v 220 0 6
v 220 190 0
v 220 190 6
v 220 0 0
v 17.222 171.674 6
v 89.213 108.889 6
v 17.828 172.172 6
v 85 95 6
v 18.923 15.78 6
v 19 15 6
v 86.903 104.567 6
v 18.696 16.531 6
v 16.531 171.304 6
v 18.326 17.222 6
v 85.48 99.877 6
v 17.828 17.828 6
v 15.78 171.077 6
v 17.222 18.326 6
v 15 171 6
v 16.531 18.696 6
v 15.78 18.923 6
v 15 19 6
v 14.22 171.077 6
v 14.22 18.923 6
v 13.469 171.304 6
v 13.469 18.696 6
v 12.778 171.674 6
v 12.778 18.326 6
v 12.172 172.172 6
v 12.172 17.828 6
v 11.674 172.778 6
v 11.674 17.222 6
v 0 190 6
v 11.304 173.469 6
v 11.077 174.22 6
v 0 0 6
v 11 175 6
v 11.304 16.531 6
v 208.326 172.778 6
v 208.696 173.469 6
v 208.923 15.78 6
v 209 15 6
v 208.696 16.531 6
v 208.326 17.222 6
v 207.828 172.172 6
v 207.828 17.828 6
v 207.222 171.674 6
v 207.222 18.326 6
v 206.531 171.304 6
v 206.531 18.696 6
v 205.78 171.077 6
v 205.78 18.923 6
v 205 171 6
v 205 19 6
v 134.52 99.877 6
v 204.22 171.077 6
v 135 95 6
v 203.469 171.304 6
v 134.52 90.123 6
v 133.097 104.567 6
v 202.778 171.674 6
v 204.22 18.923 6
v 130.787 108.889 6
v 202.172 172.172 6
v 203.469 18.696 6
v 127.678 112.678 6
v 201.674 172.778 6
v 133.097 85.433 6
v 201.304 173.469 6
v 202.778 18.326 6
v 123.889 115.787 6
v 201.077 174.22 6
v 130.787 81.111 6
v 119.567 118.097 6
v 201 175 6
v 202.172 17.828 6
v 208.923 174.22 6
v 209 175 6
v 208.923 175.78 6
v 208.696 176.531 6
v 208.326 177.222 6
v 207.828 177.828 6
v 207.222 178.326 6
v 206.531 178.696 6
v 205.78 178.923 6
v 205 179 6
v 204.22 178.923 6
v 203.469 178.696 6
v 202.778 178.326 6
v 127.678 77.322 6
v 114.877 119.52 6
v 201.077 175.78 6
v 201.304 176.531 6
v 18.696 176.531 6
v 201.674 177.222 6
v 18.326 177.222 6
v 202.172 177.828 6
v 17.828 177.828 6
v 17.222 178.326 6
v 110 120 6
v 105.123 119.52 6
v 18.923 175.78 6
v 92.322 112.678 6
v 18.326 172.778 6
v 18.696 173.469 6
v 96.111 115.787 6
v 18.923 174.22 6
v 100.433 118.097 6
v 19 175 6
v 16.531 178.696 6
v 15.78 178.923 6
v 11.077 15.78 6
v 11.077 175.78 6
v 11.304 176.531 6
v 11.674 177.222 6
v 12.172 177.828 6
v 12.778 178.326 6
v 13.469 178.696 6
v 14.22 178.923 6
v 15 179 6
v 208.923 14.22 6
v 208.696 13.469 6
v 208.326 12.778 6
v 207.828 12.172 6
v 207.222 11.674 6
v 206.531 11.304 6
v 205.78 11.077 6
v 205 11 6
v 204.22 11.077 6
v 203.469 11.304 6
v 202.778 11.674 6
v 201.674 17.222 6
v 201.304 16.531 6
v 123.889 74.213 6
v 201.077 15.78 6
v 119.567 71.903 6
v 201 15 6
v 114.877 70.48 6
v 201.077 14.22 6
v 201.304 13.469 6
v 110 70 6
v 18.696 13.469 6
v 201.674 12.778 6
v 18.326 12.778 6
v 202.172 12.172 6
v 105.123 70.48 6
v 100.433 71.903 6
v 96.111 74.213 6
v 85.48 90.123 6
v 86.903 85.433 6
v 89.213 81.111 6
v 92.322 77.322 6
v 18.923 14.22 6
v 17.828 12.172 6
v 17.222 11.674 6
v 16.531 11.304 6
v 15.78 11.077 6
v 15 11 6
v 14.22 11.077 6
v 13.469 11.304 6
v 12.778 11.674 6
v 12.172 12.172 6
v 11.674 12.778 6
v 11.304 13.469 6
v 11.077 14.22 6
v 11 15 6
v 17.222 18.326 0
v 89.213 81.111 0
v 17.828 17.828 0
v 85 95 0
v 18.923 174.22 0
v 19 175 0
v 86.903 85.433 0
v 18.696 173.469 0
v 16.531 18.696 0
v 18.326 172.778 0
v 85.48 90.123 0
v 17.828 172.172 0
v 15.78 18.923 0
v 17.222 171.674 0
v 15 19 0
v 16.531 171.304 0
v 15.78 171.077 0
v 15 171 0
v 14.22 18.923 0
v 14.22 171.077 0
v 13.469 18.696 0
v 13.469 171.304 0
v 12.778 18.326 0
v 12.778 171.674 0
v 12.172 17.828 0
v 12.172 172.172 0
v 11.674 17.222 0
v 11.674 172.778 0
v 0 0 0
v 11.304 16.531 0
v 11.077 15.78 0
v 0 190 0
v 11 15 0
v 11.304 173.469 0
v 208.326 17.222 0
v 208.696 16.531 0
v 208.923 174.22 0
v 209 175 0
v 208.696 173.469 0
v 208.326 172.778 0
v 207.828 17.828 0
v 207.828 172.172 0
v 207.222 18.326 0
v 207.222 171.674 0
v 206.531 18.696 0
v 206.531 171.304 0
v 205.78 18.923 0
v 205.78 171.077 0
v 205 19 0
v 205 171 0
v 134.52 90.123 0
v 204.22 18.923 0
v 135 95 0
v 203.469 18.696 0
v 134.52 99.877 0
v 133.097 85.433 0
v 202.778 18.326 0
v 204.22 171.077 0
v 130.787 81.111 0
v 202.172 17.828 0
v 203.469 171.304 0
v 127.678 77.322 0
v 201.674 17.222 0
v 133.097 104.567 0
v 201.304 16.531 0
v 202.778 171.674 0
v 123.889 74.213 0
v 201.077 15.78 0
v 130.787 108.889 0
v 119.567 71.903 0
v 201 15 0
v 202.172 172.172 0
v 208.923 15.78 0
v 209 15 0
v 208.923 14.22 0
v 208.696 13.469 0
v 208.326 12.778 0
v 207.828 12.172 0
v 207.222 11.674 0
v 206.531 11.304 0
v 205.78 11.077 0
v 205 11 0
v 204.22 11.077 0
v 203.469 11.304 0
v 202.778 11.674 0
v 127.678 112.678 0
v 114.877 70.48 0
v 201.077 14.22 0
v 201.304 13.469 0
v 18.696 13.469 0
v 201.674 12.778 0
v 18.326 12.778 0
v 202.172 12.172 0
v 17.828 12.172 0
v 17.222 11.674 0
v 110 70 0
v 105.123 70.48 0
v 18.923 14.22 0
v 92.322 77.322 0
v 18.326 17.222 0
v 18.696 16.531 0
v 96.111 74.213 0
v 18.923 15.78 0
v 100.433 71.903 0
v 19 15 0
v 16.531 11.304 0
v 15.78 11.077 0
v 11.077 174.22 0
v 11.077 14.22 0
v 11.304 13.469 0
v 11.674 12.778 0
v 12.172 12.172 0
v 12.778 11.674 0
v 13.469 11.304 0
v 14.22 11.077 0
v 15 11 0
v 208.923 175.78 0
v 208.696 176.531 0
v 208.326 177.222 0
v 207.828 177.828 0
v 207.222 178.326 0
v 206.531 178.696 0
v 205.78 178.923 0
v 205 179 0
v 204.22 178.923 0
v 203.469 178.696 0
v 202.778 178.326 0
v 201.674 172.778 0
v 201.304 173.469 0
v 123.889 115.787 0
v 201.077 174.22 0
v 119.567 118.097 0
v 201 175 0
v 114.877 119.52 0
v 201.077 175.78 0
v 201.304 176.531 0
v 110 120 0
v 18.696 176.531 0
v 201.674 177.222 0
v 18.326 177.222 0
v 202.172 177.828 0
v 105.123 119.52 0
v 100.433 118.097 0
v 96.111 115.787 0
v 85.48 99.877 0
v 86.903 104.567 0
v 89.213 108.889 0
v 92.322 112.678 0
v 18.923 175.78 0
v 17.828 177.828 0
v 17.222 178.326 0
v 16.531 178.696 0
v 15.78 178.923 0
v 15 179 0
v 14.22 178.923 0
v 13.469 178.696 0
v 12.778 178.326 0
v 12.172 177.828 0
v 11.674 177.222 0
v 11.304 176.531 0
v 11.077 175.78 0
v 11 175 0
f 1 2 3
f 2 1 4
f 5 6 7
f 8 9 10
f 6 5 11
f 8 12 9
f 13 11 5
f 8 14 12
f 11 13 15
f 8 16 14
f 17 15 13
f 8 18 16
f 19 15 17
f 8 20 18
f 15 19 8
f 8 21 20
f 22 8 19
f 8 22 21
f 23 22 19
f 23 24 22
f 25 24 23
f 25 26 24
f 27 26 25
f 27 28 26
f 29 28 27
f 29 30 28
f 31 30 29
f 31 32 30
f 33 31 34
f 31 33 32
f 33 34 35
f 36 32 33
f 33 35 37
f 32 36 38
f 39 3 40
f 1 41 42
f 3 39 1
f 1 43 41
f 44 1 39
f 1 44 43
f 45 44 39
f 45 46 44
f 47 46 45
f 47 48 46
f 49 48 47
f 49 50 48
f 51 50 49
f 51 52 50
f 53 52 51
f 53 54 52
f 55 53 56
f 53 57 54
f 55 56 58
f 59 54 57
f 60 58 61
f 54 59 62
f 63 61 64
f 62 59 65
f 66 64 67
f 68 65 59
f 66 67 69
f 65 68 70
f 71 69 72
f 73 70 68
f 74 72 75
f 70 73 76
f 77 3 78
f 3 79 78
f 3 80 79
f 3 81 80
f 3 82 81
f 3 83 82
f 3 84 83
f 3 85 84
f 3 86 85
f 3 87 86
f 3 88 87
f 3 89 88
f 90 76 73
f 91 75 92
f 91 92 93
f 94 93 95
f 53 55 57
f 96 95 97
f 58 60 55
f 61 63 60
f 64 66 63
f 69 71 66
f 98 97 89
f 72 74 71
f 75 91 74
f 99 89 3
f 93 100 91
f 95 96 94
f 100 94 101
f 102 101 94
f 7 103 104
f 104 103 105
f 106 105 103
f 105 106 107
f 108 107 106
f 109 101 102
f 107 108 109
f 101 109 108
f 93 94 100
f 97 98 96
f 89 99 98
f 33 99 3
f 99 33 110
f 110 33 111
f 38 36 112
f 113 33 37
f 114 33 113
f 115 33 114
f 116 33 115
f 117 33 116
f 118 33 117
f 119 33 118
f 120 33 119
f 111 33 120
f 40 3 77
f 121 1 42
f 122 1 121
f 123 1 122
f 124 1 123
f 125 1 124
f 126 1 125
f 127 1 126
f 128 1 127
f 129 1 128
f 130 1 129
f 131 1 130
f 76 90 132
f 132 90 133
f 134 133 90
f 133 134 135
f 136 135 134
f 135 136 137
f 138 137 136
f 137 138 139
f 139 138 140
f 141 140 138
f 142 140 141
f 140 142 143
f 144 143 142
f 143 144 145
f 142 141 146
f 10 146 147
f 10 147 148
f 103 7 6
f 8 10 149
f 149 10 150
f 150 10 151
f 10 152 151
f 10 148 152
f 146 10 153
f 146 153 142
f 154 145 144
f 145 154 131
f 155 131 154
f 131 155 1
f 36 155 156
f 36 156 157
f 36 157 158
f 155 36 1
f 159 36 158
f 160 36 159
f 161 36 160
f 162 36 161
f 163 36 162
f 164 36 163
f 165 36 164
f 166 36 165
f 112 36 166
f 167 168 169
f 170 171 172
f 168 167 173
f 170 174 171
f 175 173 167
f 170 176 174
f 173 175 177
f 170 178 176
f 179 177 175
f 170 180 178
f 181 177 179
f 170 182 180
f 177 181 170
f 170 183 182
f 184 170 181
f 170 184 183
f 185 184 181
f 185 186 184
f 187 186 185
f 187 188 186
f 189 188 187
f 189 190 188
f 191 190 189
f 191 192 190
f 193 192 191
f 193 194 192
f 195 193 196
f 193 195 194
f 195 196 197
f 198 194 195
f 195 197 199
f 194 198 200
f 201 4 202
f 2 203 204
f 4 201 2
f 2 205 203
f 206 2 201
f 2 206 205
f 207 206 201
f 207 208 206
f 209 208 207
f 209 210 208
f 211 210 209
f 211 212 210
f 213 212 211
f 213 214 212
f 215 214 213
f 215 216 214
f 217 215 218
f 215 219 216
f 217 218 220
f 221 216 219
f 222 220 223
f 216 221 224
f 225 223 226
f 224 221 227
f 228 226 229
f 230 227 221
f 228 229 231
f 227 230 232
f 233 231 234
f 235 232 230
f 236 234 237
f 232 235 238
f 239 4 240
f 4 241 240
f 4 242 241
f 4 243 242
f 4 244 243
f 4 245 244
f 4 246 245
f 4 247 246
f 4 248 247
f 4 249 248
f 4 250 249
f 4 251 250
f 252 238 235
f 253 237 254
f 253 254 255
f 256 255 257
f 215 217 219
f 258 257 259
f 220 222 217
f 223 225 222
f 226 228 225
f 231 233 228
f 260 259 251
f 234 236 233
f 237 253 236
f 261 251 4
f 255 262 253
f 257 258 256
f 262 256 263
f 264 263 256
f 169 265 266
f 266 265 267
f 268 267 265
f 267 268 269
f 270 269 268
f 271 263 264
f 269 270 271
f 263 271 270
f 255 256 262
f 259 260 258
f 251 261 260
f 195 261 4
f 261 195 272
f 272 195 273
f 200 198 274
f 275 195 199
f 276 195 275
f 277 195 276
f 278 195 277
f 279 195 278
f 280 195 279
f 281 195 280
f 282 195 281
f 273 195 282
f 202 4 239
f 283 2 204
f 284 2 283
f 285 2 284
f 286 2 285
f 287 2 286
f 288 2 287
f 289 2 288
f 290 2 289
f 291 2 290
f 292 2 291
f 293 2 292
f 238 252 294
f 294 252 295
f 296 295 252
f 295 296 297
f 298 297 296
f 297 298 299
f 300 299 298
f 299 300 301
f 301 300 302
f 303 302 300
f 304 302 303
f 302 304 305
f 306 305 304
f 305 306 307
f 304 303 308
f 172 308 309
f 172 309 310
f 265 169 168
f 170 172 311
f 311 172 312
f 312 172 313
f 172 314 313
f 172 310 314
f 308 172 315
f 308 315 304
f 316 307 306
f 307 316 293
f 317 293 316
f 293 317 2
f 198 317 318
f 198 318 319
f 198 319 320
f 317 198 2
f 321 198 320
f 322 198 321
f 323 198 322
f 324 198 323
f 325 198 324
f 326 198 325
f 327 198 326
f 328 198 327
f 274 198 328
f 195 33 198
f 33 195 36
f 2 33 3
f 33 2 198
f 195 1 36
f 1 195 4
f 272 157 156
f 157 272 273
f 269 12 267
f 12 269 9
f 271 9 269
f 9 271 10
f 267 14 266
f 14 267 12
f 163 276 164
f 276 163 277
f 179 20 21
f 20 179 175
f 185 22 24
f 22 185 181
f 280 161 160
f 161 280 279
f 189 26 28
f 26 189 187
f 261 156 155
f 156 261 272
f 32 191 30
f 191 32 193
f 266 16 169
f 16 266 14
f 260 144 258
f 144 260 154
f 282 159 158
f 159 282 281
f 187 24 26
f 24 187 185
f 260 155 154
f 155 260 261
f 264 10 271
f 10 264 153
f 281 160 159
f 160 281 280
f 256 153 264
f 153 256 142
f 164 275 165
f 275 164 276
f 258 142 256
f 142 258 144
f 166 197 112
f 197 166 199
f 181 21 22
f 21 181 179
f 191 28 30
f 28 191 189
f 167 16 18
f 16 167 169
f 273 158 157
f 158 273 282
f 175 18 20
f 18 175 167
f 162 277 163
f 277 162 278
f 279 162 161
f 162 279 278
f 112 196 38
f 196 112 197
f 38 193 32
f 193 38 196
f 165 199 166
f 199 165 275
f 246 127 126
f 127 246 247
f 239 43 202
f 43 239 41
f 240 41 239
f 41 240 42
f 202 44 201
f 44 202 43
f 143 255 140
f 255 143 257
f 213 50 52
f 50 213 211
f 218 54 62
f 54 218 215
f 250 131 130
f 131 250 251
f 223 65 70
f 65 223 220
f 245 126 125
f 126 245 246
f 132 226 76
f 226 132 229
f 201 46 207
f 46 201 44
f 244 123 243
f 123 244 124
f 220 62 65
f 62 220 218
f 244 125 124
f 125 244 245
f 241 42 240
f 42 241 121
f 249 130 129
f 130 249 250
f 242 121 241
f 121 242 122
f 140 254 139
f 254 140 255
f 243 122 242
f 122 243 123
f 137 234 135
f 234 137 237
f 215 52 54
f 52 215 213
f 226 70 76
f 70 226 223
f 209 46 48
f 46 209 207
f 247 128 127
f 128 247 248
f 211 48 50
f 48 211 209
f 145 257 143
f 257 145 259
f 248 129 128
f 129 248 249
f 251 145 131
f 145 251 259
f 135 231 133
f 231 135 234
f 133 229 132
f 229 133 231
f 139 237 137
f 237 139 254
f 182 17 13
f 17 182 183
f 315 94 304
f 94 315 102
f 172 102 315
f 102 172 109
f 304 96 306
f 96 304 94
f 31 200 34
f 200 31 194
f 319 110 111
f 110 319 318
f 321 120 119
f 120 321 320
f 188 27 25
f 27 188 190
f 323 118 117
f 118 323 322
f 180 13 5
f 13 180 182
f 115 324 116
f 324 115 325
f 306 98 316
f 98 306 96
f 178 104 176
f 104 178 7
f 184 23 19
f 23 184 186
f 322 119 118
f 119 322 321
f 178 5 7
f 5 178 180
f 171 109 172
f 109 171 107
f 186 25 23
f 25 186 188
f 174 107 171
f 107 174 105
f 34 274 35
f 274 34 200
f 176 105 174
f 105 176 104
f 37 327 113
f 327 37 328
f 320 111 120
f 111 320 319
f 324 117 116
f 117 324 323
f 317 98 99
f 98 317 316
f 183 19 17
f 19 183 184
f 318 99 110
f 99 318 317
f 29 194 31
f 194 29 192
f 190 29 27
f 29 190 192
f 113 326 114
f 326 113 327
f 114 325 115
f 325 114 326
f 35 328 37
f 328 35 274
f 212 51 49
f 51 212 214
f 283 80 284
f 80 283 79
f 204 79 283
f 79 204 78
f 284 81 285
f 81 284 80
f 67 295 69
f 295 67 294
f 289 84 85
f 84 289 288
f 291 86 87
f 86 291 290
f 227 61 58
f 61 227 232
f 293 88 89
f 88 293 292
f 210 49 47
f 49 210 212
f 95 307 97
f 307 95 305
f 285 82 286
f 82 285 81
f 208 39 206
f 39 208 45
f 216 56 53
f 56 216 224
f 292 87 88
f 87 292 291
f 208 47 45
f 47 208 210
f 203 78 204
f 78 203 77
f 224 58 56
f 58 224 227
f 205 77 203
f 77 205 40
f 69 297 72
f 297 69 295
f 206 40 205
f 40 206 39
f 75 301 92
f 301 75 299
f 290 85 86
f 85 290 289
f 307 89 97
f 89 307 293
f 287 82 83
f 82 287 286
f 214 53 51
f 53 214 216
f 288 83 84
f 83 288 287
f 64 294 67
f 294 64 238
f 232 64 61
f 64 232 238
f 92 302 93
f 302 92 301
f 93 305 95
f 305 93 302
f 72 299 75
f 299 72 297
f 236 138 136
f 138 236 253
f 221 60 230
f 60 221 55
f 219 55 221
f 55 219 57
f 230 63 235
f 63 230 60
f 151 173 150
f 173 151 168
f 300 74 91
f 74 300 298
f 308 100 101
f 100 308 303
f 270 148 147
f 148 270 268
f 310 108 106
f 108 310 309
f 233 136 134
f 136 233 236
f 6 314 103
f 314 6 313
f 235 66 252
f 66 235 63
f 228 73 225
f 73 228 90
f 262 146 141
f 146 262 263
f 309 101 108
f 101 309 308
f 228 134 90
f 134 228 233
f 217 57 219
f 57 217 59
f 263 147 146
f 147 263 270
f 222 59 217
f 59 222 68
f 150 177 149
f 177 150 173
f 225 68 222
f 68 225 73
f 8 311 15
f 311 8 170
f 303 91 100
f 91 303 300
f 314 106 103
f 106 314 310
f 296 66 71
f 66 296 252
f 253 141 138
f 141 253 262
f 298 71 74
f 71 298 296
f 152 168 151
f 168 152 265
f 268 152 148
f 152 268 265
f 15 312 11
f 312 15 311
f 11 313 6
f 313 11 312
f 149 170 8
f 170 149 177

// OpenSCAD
$fn = 32;

// ----------------------------------------------------------------------
// Big plate: 200-250 mm adapter plate
// ----------------------------------------------------------------------

// --- parameters (mm) ---
plate_l = 220;            // plate length, X
plate_w = 190;            // plate width, Y
plate_t = 6;              // plate thickness, Z
corner_d = 8;             // corner hole diameter
corner_in = 15;           // corner hole inset from the edges
bore_d = 50;              // central bore

difference() {
  cube([plate_l, plate_w, plate_t]);
  translate([corner_in, corner_in, -1]) cylinder(h = plate_t + 2, d = corner_d);
  translate([plate_l - corner_in, corner_in, -1]) cylinder(h = plate_t + 2, d = corner_d);
  translate([corner_in, plate_w - corner_in, -1]) cylinder(h = plate_t + 2, d = corner_d);
  translate([plate_l - corner_in, plate_w - corner_in, -1]) cylinder(h = plate_t + 2, d = corner_d);
  translate([plate_l / 2, plate_w / 2, -1]) cylinder(h = plate_t + 2, d = bore_d);
}
